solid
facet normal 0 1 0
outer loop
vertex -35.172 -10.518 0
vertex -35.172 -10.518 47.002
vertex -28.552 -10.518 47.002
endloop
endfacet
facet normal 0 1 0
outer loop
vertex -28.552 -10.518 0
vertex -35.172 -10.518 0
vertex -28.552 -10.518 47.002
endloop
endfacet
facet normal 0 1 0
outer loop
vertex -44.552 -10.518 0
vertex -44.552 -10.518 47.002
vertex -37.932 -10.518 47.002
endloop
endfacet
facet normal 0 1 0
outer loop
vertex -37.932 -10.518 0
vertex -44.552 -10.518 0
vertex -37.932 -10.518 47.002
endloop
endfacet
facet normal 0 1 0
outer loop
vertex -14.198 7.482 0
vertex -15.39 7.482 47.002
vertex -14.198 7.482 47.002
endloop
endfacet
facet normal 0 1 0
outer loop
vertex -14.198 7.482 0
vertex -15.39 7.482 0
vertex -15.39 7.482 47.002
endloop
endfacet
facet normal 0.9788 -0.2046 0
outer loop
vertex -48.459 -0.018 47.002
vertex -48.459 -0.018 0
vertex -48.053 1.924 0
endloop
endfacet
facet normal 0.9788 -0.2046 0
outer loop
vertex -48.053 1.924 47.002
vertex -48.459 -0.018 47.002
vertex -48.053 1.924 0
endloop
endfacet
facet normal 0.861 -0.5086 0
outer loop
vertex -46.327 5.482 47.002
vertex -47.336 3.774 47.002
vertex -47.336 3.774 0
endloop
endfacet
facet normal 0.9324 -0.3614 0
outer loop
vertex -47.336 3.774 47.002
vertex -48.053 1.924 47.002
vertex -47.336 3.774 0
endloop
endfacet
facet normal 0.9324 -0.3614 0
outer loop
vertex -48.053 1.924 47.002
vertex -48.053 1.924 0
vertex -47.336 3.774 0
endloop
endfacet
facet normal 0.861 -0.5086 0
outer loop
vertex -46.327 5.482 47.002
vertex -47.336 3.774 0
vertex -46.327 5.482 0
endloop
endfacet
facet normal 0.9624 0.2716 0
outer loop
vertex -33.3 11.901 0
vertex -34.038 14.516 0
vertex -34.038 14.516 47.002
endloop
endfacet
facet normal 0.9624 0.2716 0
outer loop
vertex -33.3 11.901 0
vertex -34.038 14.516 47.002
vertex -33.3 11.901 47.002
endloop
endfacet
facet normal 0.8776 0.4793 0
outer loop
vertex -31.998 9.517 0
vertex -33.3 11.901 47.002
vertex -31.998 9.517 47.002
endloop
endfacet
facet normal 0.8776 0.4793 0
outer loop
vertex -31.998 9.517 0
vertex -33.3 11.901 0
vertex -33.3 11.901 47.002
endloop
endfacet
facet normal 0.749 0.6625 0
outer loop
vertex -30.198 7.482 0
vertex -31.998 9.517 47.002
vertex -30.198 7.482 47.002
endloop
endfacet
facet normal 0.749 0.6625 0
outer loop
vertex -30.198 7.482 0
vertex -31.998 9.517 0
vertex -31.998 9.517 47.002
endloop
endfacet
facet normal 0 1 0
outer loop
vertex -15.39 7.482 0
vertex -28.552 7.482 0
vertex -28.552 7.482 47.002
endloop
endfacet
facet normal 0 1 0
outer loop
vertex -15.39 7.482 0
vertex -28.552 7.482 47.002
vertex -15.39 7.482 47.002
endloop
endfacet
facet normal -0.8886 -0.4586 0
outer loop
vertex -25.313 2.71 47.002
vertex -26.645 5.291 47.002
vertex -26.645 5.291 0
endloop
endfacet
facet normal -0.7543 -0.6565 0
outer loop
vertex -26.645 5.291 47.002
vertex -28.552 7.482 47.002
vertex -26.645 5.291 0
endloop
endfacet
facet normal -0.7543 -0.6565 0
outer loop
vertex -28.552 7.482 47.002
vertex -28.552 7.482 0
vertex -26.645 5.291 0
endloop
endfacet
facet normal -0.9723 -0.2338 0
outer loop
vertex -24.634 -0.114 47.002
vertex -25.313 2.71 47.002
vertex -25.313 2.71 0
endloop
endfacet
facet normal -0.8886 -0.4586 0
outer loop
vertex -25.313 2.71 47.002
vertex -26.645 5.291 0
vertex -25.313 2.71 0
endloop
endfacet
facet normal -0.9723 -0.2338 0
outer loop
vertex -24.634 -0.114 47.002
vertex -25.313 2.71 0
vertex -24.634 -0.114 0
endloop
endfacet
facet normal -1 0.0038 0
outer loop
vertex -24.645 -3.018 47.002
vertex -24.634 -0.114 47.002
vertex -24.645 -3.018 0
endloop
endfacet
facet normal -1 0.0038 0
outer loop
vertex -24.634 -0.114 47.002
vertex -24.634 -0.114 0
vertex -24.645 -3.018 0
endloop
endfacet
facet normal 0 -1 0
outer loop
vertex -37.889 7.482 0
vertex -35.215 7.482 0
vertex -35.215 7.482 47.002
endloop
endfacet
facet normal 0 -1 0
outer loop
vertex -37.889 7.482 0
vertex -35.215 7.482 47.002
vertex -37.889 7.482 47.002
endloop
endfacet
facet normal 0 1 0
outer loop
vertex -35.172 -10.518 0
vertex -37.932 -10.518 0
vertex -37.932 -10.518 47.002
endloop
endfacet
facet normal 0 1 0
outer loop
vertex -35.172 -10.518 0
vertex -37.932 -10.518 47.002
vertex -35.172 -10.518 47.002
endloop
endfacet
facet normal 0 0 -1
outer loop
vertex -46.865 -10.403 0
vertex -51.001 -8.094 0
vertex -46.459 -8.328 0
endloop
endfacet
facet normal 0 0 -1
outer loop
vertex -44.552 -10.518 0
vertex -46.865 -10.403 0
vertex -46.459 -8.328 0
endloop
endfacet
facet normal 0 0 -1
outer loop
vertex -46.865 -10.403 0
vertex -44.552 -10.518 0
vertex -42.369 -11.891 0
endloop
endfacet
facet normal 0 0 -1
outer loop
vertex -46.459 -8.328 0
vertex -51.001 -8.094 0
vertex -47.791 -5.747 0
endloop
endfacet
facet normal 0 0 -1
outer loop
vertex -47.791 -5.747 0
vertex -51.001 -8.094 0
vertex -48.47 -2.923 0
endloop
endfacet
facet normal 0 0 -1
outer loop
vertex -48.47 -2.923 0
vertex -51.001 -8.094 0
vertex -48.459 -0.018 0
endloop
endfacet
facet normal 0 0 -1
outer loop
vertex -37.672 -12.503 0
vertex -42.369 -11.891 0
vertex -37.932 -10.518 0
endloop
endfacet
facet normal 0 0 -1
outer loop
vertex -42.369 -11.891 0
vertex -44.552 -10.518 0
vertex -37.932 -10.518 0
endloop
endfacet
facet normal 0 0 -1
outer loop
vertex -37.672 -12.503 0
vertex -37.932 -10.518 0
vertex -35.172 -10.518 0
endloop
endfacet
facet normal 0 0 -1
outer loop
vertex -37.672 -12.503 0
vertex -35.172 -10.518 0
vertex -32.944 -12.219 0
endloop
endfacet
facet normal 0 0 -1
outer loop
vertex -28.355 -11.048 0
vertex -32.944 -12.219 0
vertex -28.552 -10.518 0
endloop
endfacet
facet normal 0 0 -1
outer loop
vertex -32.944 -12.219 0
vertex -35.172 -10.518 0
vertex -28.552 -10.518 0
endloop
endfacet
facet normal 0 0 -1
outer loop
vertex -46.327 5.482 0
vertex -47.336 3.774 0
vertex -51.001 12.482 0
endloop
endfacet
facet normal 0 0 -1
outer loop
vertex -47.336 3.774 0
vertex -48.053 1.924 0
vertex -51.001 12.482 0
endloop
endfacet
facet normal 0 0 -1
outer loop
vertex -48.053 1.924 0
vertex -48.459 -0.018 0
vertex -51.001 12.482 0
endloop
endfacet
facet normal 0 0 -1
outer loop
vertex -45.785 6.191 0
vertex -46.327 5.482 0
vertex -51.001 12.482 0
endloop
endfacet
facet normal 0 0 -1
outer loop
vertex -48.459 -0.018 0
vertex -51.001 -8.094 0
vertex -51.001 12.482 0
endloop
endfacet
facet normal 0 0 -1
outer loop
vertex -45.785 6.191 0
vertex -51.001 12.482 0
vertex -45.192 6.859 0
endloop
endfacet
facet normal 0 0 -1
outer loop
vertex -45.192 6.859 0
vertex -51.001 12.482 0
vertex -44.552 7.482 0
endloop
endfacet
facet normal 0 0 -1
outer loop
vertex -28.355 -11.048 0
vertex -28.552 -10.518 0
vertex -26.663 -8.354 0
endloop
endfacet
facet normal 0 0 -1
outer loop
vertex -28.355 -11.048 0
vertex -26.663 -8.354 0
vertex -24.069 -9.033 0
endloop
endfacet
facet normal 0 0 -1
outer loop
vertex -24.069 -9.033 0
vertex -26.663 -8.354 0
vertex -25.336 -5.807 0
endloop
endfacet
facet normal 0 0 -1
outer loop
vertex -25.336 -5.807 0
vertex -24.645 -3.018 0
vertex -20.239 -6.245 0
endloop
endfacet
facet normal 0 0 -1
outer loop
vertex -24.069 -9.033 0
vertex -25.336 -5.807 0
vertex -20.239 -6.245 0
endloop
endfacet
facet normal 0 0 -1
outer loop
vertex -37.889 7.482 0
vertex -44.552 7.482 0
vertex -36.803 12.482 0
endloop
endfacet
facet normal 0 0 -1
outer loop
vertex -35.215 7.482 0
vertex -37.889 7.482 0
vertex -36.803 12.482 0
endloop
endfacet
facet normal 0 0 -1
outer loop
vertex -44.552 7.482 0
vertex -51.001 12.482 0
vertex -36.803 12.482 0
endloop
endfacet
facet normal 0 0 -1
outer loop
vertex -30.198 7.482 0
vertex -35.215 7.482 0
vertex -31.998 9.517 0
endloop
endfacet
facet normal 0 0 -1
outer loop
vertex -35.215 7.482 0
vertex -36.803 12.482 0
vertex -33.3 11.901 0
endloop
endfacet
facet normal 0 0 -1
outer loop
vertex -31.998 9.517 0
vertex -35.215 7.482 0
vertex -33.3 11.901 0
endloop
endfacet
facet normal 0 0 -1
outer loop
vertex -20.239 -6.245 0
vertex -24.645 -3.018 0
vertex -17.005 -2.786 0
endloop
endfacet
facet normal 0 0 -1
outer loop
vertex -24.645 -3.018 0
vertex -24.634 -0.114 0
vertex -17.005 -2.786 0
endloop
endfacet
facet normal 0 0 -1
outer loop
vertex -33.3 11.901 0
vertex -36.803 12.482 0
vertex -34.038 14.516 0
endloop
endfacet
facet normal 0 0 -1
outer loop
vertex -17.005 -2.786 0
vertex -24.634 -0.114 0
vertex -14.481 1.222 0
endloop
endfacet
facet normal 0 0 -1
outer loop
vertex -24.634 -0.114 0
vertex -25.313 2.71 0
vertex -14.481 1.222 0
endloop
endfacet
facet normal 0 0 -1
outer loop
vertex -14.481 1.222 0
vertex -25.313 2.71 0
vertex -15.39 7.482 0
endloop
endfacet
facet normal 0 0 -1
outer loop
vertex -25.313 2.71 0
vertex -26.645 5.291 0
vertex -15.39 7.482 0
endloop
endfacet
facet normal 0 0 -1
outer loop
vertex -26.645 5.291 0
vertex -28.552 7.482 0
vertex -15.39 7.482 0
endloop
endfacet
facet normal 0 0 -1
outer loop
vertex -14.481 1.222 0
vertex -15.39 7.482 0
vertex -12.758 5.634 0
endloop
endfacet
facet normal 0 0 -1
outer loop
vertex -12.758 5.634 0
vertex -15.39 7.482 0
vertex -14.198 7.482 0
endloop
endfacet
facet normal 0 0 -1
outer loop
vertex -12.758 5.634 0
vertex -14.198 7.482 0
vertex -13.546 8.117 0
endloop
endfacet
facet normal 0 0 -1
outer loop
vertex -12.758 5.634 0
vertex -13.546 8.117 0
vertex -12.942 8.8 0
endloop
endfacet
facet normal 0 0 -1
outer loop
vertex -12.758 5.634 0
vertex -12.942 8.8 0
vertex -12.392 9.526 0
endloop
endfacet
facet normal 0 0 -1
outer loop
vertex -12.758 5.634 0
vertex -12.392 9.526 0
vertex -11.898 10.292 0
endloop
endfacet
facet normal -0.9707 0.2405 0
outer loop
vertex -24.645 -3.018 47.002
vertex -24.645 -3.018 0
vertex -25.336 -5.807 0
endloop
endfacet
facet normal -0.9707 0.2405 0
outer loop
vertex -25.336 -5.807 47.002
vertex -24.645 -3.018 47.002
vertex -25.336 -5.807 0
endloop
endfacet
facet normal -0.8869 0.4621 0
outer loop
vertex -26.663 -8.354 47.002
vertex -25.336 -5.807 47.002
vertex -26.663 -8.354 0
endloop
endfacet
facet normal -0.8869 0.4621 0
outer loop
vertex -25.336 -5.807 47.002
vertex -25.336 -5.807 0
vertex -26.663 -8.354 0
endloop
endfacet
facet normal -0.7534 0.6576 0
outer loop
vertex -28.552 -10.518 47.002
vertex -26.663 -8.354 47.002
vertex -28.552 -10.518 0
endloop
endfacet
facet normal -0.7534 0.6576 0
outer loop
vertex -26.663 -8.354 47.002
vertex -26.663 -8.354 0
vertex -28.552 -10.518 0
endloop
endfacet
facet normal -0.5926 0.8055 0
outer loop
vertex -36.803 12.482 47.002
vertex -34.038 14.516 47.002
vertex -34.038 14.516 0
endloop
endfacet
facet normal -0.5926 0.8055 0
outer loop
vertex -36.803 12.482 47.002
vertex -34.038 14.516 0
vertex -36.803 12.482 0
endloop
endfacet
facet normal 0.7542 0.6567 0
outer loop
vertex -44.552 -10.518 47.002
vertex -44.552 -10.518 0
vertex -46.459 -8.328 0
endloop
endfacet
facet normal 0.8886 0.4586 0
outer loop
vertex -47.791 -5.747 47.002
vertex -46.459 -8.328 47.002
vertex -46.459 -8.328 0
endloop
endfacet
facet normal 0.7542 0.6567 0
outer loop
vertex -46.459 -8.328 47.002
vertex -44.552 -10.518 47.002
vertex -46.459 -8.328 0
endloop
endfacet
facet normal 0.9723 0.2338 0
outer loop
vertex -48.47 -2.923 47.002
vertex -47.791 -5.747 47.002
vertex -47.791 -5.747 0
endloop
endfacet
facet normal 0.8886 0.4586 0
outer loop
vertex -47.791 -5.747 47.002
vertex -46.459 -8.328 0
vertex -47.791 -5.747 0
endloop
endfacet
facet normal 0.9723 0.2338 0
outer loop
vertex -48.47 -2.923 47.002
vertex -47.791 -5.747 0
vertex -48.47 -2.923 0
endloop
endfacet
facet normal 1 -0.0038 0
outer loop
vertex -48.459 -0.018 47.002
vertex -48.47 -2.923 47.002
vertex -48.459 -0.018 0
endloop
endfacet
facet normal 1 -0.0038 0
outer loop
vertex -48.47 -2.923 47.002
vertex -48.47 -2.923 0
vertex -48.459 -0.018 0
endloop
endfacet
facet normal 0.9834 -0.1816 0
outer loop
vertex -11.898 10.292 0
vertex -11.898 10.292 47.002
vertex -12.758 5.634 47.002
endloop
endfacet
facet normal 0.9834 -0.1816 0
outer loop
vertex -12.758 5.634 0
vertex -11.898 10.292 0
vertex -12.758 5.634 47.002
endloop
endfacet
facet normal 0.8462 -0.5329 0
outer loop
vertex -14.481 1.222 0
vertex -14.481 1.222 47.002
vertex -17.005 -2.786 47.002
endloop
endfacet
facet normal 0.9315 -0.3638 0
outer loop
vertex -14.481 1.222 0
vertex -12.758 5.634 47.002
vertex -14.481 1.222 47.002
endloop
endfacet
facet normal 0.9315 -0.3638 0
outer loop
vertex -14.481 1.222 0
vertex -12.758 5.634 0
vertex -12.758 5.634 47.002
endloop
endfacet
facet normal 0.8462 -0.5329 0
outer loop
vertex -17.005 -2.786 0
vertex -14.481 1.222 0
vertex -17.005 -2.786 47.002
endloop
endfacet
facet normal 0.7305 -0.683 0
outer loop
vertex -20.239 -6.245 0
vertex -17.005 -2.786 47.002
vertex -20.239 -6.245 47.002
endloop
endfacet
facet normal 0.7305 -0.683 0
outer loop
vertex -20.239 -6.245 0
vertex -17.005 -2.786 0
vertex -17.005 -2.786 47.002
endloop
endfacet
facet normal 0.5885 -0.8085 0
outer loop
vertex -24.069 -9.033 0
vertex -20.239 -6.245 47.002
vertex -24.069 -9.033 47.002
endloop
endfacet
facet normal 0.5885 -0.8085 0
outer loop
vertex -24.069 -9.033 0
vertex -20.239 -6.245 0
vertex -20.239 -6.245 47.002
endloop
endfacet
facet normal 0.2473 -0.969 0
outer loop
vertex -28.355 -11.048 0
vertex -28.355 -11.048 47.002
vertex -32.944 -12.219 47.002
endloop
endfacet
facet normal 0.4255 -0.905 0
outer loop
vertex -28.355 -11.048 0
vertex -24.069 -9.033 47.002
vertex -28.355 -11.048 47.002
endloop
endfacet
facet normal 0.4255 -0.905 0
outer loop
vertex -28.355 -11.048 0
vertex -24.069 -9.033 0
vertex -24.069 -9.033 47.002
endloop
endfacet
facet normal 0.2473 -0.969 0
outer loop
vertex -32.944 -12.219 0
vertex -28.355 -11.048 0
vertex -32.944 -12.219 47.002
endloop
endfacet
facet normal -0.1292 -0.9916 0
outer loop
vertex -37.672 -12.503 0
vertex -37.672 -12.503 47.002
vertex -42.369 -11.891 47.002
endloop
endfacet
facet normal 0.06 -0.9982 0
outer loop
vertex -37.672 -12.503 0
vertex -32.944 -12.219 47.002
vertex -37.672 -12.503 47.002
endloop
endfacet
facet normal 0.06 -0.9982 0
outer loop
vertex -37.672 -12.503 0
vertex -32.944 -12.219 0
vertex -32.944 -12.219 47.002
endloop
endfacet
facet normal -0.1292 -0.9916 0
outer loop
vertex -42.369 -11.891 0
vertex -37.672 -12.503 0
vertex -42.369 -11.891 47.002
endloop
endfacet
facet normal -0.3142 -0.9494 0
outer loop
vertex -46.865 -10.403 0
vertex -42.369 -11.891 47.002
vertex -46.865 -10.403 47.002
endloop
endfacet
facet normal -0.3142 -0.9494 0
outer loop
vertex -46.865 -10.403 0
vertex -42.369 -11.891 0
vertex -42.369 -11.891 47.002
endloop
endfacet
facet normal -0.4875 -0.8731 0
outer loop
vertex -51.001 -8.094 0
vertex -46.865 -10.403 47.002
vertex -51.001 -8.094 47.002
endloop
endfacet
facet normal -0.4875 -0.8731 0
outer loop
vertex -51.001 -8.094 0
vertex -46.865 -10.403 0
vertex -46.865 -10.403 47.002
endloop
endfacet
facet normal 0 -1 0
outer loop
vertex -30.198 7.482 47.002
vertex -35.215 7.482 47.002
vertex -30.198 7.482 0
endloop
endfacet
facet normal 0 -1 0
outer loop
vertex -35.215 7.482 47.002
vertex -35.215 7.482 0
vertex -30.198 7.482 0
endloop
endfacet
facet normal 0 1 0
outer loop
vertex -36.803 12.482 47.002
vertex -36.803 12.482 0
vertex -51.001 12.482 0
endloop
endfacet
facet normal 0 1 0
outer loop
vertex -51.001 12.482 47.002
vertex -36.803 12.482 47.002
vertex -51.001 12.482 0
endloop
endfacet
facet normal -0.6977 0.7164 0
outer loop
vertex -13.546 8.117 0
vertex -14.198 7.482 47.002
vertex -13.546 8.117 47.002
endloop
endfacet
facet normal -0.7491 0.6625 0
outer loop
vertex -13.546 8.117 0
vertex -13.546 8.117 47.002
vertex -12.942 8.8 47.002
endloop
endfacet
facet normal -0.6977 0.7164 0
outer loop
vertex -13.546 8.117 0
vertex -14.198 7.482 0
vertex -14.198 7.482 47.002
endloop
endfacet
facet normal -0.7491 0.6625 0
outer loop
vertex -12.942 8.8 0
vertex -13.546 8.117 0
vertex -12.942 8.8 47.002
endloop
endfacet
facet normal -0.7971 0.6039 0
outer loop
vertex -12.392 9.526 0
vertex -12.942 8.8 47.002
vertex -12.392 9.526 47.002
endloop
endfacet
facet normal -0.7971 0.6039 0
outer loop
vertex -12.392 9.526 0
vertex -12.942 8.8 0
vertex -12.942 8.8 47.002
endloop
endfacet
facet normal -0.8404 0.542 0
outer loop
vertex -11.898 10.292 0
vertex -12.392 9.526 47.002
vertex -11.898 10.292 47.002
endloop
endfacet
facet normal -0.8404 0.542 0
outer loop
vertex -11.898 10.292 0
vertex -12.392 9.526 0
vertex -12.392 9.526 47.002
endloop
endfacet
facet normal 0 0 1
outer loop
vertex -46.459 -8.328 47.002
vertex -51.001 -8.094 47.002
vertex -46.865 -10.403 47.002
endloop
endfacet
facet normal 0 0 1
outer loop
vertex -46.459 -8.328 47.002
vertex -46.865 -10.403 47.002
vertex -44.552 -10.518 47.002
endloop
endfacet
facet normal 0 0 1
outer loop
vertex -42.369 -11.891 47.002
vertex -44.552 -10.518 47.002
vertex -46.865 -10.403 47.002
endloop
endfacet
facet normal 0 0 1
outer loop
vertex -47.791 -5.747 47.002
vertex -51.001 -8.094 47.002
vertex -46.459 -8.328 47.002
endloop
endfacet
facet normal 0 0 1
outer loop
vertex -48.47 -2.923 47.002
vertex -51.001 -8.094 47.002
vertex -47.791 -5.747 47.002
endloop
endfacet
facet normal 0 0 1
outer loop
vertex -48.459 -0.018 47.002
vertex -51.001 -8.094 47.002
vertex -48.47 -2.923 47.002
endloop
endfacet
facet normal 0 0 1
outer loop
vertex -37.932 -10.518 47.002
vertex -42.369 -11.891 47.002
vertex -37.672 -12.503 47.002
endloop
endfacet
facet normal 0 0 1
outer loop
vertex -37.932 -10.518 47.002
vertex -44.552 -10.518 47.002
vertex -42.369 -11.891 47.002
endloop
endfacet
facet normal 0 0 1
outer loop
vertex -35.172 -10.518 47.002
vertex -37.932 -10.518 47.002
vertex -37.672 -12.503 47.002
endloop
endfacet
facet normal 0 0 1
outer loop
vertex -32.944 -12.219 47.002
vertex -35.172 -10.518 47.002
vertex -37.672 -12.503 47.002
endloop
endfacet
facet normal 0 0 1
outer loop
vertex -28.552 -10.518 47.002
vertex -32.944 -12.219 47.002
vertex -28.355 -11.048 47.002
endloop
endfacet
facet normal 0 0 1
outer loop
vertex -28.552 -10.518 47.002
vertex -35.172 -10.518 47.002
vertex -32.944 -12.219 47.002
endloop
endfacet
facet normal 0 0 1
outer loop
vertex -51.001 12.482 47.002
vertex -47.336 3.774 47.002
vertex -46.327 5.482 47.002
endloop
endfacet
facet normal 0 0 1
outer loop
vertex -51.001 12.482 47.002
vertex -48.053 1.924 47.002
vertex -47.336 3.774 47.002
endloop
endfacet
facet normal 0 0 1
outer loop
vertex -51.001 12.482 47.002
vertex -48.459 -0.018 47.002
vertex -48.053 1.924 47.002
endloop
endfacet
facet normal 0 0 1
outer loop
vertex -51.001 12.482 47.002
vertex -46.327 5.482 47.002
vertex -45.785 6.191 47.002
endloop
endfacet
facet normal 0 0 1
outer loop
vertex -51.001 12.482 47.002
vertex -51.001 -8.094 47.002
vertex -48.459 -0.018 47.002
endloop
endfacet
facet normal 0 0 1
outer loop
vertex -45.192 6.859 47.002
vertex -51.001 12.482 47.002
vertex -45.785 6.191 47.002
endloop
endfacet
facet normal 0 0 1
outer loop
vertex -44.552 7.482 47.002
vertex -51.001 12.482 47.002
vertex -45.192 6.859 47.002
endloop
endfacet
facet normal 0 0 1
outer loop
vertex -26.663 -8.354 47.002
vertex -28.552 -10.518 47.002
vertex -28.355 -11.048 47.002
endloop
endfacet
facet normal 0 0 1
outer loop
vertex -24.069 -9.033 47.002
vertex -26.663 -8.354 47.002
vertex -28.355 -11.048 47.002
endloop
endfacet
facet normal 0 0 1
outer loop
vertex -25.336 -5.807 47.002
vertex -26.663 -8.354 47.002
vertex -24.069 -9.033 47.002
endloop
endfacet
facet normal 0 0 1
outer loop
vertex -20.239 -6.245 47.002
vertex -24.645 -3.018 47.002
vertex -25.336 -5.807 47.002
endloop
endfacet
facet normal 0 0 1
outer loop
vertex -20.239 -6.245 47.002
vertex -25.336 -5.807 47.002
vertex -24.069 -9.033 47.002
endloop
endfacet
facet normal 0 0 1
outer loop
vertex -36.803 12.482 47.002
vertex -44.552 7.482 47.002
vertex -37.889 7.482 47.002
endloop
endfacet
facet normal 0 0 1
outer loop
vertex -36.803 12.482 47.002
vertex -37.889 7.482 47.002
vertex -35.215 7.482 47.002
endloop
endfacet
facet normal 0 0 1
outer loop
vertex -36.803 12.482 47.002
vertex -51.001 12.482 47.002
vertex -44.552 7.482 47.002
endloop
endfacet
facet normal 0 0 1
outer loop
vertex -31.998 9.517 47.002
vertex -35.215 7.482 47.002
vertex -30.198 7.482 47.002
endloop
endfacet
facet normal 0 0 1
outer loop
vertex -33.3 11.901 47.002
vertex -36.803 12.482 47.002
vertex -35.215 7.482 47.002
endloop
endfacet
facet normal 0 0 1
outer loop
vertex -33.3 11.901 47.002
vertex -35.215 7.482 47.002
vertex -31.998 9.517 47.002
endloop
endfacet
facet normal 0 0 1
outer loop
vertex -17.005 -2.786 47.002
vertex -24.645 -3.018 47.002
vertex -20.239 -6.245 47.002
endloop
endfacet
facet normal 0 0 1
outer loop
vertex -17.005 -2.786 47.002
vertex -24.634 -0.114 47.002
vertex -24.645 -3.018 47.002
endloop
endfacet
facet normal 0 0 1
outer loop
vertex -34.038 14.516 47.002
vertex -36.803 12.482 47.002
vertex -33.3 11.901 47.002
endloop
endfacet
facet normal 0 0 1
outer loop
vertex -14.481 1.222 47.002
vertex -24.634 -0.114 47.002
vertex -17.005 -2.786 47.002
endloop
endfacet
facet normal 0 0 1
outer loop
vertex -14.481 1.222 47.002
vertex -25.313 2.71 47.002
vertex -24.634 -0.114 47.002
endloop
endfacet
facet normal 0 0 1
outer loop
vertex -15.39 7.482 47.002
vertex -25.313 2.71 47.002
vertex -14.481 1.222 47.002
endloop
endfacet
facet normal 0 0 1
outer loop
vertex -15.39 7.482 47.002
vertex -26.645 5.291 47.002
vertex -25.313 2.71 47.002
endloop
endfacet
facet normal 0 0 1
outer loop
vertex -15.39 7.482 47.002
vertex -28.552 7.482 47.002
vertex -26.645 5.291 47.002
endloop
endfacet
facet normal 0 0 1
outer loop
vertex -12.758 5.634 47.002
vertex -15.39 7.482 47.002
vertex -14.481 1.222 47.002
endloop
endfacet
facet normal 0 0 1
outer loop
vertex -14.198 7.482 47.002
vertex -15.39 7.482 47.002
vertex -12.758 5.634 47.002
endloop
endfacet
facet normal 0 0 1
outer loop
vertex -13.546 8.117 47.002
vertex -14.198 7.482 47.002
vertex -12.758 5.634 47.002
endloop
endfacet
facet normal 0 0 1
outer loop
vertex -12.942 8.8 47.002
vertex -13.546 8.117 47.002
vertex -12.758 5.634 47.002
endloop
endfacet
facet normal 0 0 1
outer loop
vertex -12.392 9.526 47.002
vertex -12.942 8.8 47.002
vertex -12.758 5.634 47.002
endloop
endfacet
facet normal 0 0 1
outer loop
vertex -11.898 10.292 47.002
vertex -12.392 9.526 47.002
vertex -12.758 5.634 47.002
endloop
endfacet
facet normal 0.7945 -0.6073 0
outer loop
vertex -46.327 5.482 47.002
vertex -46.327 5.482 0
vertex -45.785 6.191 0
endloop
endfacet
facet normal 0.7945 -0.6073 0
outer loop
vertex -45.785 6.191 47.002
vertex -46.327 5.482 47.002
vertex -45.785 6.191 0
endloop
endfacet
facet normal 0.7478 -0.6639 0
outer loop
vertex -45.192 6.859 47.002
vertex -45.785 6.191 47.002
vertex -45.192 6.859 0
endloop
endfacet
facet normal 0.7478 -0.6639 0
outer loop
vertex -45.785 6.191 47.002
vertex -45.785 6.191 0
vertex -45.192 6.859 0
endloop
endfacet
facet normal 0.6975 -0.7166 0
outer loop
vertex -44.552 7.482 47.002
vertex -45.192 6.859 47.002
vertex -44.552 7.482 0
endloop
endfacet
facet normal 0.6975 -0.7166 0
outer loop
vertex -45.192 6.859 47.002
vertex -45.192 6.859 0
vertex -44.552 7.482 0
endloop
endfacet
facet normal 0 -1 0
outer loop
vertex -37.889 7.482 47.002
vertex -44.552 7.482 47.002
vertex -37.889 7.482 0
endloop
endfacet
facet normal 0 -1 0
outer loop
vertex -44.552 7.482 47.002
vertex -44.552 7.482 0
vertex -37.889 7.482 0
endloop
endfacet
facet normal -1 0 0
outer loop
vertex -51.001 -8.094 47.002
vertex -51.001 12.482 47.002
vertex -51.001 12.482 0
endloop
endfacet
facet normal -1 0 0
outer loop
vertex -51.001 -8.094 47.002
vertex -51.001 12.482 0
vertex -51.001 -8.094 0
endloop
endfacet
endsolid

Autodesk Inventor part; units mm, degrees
ref_plane "YZ Plane" through (0, 0, 0) normal (1, 0, 0) x (0, 1, 0)
ref_plane "XZ Plane" through (0, 0, 0) normal (0, 1, 0) x (-1, 0, 0)
ref_plane "Work Plane1" through (-51.0014, -51.0767, 47.0039) normal (0, 0, -1) x (0, 1, 0)
sketch "Sketch1" plane through (0, 0, 0) normal (0, 0, 1) x (1, 0, 0)
  arc A0 (-51.0008, -8.0945) -> (-16.665, 27.298) centre (-36.8015, 12.4817) ccw
  line L0 (15.6539, 51.0767) -> (-36.8027, 12.4817) projected
  line L1 (-36.8027, 12.4817) -> (-51.0008, 12.4817) projected
  line L2 (-51.0008, 12.4817) -> (-51.0008, -51.0767) projected
  line L3 (-15.3897, 25.4817) -> (-29.0068, 25.4817) projected
  line L4 (-14.1984, 25.4817) -> (-15.3897, 25.4817) projected
  ellipse E0 centre (-22.3234, 16.4817) end of major axis (-22.3234, 28.6067) minor radius 12.125 (-14.1984, 7.4817) -> (-14.1984, 25.4817) ccw projected
  line L5 (-15.3897, 7.4817) -> (-14.1984, 7.4817) projected
  line L6 (-29.0068, 7.4817) -> (-15.3897, 7.4817) projected
  line L7 (-30.1984, 7.4817) -> (-29.0068, 7.4817) projected
  ellipse E1 centre (-22.0734, 16.4817) end of major axis (-22.0734, 4.3567) minor radius 12.125 (-30.1984, 25.4817) -> (-30.1984, 7.4817) ccw projected
  line L8 (-44.552, -10.5183) -> (-37.9322, -10.5183) projected
  line L9 (-37.9322, -10.5183) -> (-35.1718, -10.5183) projected
  line L10 (-35.1718, -10.5183) -> (-28.552, -10.5183) projected
  arc A1 (-28.552, -10.5183) -> (-24.6451, -3.0183) centre (-36.677, -1.5183) ccw projected
  arc A2 (-28.552, -10.5183) -> (-28.552, 7.4817) centre (-36.677, -1.5183) ccw projected
  line L11 (-35.2148, 7.4817) -> (-28.552, 7.4817) projected
  line L12 (-35.2148, 7.4817) -> (-37.8892, 7.4817) projected
  line L13 (-44.552, 7.4817) -> (-37.8892, 7.4817) projected
  arc A3 (-44.552, 7.4817) -> (-46.3273, 5.4817) centre (-36.427, -1.5183) ccw projected
  ellipse E2 centre (-36.4279, -1.5183) end of major axis (-36.4279, -13.1433) minor radius 11.625 (-44.3583, 6.9817) -> (-44.3583, -10.0183) ccw projected
  arc A4 (-46.3273, 5.4817) -> (-48.4589, -0.0183) centre (-36.427, -1.5183) ccw projected
  arc A5 (-44.552, 7.4817) -> (-44.552, -10.5183) centre (-36.427, -1.5183) ccw projected
  point P0 (0, 0)
  point P1 (-11.8976, 10.2915)
  point P2 (-34.0379, 14.5159)
  point P3 (-15.4473, 25.4817)
  point P4 (-19.1337, 25.4817)
  point P5 (-16.6653, 27.2981)
  point P6 (-51.0008, -8.0945)
  dimension "d0" = 50
extrude "Extrusion1" add sketch "Sketch1" along normal up to surface (47.0015 mm away) contours L2 L1 L0 E1 L11 L12 L13 A3 A4 A5 L8 L9 L10 A1 A2 L6 L5 E0 A0
properties part number "ROTATE"
